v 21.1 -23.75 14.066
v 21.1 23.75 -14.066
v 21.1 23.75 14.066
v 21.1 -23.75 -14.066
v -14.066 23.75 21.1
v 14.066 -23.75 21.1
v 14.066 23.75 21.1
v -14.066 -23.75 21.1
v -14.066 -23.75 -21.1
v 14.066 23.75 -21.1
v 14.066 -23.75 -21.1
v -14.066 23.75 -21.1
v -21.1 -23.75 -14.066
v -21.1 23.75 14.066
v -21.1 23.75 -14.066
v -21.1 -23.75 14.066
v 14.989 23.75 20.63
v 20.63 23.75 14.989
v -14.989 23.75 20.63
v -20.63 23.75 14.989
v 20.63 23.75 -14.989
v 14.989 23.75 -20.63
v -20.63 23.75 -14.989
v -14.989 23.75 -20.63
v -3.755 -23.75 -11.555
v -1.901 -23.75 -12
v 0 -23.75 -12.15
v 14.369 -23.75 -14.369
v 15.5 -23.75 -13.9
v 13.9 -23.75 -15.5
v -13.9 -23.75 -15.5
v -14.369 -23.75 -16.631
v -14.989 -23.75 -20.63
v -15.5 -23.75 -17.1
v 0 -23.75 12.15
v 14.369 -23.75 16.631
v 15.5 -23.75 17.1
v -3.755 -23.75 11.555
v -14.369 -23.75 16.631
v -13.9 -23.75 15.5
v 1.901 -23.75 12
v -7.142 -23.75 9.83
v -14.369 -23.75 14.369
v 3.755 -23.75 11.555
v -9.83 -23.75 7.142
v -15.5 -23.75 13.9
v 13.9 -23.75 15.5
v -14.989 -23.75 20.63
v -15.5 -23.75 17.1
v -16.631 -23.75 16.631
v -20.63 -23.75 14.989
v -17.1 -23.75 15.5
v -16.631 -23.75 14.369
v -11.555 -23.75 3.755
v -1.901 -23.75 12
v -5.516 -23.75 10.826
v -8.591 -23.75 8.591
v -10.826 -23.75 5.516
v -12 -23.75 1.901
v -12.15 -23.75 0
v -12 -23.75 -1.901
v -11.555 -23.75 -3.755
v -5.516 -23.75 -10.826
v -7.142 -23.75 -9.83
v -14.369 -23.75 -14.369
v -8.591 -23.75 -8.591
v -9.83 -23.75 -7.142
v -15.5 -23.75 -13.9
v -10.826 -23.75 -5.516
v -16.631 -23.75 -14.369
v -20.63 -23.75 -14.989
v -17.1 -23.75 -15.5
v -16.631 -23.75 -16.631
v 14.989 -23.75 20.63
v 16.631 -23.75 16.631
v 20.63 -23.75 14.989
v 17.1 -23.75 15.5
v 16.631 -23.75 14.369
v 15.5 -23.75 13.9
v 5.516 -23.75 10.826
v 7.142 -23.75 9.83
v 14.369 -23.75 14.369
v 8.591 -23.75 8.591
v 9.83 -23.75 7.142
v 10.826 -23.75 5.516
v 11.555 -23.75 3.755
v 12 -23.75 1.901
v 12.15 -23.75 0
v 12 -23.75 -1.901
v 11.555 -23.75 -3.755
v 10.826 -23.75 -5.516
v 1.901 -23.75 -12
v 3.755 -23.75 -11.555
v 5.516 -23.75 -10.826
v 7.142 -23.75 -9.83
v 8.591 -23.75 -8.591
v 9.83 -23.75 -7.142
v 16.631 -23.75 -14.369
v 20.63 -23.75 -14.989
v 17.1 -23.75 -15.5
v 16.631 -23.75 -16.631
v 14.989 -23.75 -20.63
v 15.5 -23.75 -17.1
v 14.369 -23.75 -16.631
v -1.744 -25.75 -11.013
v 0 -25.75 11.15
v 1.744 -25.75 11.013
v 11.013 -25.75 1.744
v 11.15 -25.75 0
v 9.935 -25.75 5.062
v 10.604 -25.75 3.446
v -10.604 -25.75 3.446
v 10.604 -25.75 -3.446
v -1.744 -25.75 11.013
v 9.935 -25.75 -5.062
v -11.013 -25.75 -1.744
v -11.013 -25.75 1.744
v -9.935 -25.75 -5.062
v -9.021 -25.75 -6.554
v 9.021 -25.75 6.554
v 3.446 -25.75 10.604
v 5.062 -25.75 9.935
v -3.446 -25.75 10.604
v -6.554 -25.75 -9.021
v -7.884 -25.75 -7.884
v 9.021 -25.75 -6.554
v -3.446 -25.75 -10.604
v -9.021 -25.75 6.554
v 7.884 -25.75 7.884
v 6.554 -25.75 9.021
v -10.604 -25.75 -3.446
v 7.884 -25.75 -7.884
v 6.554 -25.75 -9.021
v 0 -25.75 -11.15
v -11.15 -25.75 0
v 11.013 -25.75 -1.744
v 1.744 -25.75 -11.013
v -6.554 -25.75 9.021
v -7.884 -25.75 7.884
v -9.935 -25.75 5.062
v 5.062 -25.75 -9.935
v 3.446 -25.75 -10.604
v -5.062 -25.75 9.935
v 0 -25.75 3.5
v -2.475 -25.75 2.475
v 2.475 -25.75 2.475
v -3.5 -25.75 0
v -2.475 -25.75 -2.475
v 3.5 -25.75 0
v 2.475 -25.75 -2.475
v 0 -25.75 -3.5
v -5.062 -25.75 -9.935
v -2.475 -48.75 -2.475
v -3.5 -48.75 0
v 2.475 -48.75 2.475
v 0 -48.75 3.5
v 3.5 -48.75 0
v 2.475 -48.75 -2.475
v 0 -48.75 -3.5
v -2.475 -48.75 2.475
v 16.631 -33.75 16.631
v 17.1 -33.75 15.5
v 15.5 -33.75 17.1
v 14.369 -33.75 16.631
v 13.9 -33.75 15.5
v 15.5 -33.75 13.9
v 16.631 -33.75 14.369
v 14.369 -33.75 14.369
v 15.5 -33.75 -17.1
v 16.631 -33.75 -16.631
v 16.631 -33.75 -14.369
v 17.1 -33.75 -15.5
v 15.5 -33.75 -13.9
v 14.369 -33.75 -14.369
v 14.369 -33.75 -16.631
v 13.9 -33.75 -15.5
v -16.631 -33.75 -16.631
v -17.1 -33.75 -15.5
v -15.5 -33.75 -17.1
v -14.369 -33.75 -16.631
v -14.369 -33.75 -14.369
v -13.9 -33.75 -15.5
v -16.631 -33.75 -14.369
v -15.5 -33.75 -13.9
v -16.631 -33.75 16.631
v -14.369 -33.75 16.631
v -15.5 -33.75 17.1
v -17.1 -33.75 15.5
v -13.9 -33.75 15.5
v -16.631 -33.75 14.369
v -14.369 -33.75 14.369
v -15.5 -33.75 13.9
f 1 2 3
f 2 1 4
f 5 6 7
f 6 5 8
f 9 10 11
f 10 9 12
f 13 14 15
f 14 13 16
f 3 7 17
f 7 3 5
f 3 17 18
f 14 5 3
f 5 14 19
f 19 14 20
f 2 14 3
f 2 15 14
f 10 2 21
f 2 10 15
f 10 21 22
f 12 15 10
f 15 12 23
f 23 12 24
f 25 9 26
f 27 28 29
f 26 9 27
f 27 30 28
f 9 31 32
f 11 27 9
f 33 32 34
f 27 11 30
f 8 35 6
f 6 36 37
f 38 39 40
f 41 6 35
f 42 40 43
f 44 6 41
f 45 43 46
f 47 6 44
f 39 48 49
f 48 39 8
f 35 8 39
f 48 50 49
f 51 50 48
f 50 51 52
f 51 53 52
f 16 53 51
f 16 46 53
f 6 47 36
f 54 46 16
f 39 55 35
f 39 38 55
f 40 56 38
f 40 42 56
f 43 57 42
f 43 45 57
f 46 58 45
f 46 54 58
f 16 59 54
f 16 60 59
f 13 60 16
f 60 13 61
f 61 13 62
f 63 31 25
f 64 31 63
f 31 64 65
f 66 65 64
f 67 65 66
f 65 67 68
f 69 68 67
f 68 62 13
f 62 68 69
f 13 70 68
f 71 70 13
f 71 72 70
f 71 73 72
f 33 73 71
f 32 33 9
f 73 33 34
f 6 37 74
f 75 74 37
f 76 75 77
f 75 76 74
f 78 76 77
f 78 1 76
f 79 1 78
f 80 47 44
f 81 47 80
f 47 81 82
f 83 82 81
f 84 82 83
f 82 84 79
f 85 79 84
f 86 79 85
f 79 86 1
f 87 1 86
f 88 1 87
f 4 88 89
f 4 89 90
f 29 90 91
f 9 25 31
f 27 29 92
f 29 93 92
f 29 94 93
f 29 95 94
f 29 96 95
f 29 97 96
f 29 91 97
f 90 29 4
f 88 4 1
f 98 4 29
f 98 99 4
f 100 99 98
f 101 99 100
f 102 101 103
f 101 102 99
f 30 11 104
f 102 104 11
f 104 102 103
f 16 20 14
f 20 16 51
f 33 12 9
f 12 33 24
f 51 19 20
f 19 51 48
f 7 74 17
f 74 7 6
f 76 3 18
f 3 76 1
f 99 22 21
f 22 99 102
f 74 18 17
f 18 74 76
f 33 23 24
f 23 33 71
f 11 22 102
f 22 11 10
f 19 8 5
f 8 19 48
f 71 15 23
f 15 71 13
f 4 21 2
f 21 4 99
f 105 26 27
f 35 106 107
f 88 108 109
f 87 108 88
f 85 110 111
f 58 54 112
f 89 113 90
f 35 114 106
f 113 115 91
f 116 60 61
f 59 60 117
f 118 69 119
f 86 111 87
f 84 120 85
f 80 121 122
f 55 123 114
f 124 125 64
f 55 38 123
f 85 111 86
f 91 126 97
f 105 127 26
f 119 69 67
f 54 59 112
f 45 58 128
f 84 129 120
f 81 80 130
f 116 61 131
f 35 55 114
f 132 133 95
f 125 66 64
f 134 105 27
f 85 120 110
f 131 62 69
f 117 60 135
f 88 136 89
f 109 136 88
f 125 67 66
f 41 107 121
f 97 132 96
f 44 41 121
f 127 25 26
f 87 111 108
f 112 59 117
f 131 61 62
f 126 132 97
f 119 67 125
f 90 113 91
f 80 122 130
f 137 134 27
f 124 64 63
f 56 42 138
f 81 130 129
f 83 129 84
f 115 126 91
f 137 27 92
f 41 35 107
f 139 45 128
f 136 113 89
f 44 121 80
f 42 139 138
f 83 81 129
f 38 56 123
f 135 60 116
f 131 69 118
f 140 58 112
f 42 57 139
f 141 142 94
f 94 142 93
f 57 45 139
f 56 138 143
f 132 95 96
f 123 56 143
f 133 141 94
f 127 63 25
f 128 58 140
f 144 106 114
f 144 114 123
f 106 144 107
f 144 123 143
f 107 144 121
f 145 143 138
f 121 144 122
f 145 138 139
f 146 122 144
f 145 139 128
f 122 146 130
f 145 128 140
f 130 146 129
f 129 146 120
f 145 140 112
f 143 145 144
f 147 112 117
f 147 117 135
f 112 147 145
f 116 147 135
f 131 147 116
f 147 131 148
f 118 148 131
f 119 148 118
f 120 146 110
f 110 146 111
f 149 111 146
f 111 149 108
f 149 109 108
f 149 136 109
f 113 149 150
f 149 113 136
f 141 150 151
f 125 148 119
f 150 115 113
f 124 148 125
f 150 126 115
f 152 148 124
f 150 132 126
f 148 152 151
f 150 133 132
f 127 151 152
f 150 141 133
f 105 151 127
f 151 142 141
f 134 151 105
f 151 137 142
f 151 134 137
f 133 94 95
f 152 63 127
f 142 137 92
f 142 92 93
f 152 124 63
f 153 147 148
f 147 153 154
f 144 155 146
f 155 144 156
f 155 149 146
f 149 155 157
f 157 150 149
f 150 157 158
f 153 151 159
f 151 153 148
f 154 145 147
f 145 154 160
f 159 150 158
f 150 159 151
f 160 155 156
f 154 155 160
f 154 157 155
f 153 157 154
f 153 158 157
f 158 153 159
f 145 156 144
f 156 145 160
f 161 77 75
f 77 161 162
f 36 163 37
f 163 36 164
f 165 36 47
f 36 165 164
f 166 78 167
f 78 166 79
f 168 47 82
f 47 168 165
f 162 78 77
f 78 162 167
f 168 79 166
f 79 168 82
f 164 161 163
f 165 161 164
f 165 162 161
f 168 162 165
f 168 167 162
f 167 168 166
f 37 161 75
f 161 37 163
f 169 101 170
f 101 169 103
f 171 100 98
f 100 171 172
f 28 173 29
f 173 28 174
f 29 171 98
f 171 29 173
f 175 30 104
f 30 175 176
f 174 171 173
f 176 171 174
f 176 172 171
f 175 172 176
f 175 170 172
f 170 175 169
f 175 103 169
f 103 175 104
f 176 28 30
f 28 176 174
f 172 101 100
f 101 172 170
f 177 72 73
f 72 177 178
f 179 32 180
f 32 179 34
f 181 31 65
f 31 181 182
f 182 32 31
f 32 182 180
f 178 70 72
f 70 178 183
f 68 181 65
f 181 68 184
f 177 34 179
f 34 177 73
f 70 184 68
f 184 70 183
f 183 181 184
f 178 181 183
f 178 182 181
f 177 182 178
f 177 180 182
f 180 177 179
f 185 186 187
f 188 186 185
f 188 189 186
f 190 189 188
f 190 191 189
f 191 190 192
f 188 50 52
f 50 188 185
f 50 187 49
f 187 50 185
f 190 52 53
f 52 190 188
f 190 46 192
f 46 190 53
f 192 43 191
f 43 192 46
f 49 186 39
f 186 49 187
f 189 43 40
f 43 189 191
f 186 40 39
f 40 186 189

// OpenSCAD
// file: beam.scad
// Misumi Beam
module misumibeam(size1=15, size2=15, length=100, extra=0.1) {
   difference() {
      cube([size1+extra, size2+extra, length], center=true);
      for (a = [0:180:180]) rotate([0, 0, a]) {
         translate([size1/2, 0, 0]) {
          //  % cube([size1/2, 3, length+1], center=true);
			minkowski() {
               cube([size1/2-(extra+1), size1/6-extra, length+1], center=true);
               cylinder(r=0.5, h=1, center=true);
			} 
        }
      }
      for (a = [0:90:270]) rotate([0, 0, a]) {
         translate([size2/2, 0, 0]) {
          //  % cube([size1/2, 3, length+1], center=true);
			minkowski() {
               cube([size1/2-(extra+1), size1/6-extra, length+1], center=true);
               cylinder(r=0.5, h=1, center=true);
			} 
        }
      }
   }
}

# misumibeam(15, 15, 300);
// file: metric_fastners.scad
/*
 *  OpenSCAD Metric Fastners Library (www.openscad.org)
 *  Copyright (C) 2010-2011  Giles Bathgate
 *
 *  This program is free software; you can redistribute it and/or modify
 *  it under the terms of the GNU General Public License as published by
 *  the Free Software Foundation; either version 3 of the License,
 *  LGPL version 2.1, or (at your option) any later version of the GPL.
 *
 *  This program is distributed in the hope that it will be useful,
 *  but WITHOUT ANY WARRANTY; without even the implied warranty of
 *  MERCHANTABILITY or FITNESS FOR A PARTICULAR PURPOSE.  See the
 *  GNU General Public License for more details.
 *
 *  You should have received a copy of the GNU General Public License
 *  along with this program; if not, write to the Free Software
 *  Foundation, Inc., 59 Temple Place, Suite 330, Boston, MA 02111-1307 USA
 *
*/

$fn=50;
apply_chamfer=false;

// M3 Mesurements
m3_minor_radius = 2.50/2;
m3_major_radius = 3.00/2;
m3_head_radius = 5.50/2;
m3_nut_radius = 6.20/2;

// M4 Mesurements
m4_minor_radius = 3.30/2;
m4_major_radius = 4.00/2;
m4_head_radius = 7.00/2;
m4_nut_radius = 8.26/2;

// M5 Mesurements
m5_minor_radius = 4.20/2;
m5_major_radius = 5.00/2;
m5_head_radius = 8.50/2;
m5_nut_radius = 10.33/2;

// M6 Mesurements
m6_minor_radius = 5.00/2;
m6_major_radius = 6.00/2;
m6_head_radius = 10.00/2;
m6_nut_radius = 12.40/2;


module cap_bolt(dia,len)
{
	e=1.5*dia;
	h1=1.25*dia;
	cylinder(r=dia/2,h=len);
	translate([0,0,-h1]) cylinder(r=e/2,h=h1);
}

module cap_bolt_boolean(dia,len,fn=8)
{
	e=1.87*dia;
	h1=2*dia;
	cylinder(r=dia/2,h=len,$fn=fn);
	translate([0,0,-h1+0.05]) cylinder(r2=e/2+0.15,r1=e/2+0.3,h=h1,$fn=fn);
}

module csk_bolt(dia,len)
{
	h1=0.6*dia;
	h2=len-h1;
	cylinder(r=dia/2,h=h2);
	cylinder(r1=dia,r2=dia/2,h=h1);
}

module washer(dia)
{
	t=0.1*dia;
	difference()
	{
		cylinder(r=dia,h=t);
		translate([0,0,-t/2])cylinder(r=dia/2,h=t*2);
	}
}

module flat_nut(dia)
{
	m=0.8*dia;
	e=2.066*dia;
	c=0.2*dia;
	difference()
	{
		cylinder(r=e/2,h=m,$fn=6);
		translate([0,0,-m/2])cylinder(r=dia/2,h=m*2);
		if(apply_chamfer)
		    translate([0,0,c])cylinder_chamfer(e/2,c);
	}
}

module flat_nut_boolean(dia)
{
	m=0.8*dia;
	e=2.066*dia;
	c=0.2*dia;
	difference()
	{
		cylinder(r=e/2,h=m,$fn=6);
		if(apply_chamfer)
		    translate([0,0,c])cylinder_chamfer(e/2,c);
	}
}

module bolt(dia,len)
{
	e=1.8*dia;
	k=0.7*dia;
	c=0.2*dia;
	difference()
	{
		cylinder(r=e/2,h=k,$fn=6);
		if(apply_chamfer)
		    translate([0,0,c])cylinder_chamfer(e/2,c);
	}

	cylinder(r=dia/2,h=len);

}

module cylinder_chamfer(r1,r2)
{
	t=r1-r2;
	p=r2*2;
	rotate_extrude()
	difference()
	{
		translate([t,-p])square([p,p]);
		translate([t,0])circle(r2);
	}
}

module chamfer(len,r)
{
	p=r*2;
	linear_extrude(height=len)
	difference()
	{
		square([p,p]);
		circle(r);
	}
}

union()
{
//cap_bolt(3,15);
//cap_bolt_boolean(3,15,30);
//csk_bolt(3,14);
//washer(3);
//flat_nut_boolean(3);
//bolt(4,14);
//cylinder_chamfer(8,1);
//chamfer(10,2);
}
// file: configuration.scad
// Delta-Six 3D Printer 
// Created by Sage Merrill
// Released on Openbuilds.com
// Based on orginal design by Johann C. Rocholl (Kossel Printer)
// License = Attribution Share Alike - CC BY SA


include <metric_fastners.scad>;
use <nema17.scad>;
use <beam.scad>;
use <timing_belts.scad>;

$fn=20;

// Increase this if your slicer or printer makes the holes too small.
extra_radius = 0.10;
extra_boolean = 0.15;

// Delta Parameters
global_delta_arm_seperation = 55;
global_effector_bore_radius = 21;
global_mounting_hole_radius = 27;

// M5 Hardware
m5_bolt = m5_major_radius*2;
m5_bolt_boolean = m5_bolt+extra_radius;

// M3 Hardware
m3_bolt = m3_major_radius*2;
m3_bolt_boolean = m3_bolt+extra_radius;

// NEMA17 stepper motor
motor_length = 47.5;
motor_shaft_radius= 5.00/2;
// main file
include <configuration.scad>;

// NEMA17 stepper motor

module stepper_motor(length=47.5, shaft_radius=5.00/2) {
   intersection() {
      cube([42.2, length, 42.2], center=true);
      rotate([90, 0, 0])
      cylinder(r=25.5, h=length+1, center=true);
   }
   translate([0, -length/2, 0]) {
// drive shaft
		rotate([90, 0, 0]) {
		 cylinder(r1=11, r2=11, h=2, $fn=40);
		 cylinder(r=shaft_radius, h=25);
		}
// mounting bolts
      for (a = [0:90:360]) rotate([0, a, 0]) {
         translate([15.5, 0, 15.5]) rotate([90, 0, 0])
         cylinder(r=m3_major_radius, h=10,  $fn=30);
      }
   }
}

module stepper_motor_boolean(length=47.5, shaft_radius=7.00/2) {
   intersection() {
      cube([42.2, length, 42.2], center=true);
      rotate([90, 0, 0])
      cylinder(r=25.5, h=length+1, center=true);
   }
   translate([0, -length/2, 0]) {
// drive shaft
		rotate([90, 0, 0]) {
		 cylinder(r1=12+extra_boolean, r2=11+extra_boolean, h=2, $fn=40);
		 cylinder(r=shaft_radius, h=25, $fn=8);
		}
// mounting bolts
      for (a = [0:90:360]) rotate([0, a, 0]) {
         translate([15.5, 0, 15.5]) rotate([90, 0, 0])
         cylinder(r=m3_major_radius+extra_radius, h=10,  $fn=8);
      }
   }
}

//# stepper_motor();
# stepper_motor_boolean();
